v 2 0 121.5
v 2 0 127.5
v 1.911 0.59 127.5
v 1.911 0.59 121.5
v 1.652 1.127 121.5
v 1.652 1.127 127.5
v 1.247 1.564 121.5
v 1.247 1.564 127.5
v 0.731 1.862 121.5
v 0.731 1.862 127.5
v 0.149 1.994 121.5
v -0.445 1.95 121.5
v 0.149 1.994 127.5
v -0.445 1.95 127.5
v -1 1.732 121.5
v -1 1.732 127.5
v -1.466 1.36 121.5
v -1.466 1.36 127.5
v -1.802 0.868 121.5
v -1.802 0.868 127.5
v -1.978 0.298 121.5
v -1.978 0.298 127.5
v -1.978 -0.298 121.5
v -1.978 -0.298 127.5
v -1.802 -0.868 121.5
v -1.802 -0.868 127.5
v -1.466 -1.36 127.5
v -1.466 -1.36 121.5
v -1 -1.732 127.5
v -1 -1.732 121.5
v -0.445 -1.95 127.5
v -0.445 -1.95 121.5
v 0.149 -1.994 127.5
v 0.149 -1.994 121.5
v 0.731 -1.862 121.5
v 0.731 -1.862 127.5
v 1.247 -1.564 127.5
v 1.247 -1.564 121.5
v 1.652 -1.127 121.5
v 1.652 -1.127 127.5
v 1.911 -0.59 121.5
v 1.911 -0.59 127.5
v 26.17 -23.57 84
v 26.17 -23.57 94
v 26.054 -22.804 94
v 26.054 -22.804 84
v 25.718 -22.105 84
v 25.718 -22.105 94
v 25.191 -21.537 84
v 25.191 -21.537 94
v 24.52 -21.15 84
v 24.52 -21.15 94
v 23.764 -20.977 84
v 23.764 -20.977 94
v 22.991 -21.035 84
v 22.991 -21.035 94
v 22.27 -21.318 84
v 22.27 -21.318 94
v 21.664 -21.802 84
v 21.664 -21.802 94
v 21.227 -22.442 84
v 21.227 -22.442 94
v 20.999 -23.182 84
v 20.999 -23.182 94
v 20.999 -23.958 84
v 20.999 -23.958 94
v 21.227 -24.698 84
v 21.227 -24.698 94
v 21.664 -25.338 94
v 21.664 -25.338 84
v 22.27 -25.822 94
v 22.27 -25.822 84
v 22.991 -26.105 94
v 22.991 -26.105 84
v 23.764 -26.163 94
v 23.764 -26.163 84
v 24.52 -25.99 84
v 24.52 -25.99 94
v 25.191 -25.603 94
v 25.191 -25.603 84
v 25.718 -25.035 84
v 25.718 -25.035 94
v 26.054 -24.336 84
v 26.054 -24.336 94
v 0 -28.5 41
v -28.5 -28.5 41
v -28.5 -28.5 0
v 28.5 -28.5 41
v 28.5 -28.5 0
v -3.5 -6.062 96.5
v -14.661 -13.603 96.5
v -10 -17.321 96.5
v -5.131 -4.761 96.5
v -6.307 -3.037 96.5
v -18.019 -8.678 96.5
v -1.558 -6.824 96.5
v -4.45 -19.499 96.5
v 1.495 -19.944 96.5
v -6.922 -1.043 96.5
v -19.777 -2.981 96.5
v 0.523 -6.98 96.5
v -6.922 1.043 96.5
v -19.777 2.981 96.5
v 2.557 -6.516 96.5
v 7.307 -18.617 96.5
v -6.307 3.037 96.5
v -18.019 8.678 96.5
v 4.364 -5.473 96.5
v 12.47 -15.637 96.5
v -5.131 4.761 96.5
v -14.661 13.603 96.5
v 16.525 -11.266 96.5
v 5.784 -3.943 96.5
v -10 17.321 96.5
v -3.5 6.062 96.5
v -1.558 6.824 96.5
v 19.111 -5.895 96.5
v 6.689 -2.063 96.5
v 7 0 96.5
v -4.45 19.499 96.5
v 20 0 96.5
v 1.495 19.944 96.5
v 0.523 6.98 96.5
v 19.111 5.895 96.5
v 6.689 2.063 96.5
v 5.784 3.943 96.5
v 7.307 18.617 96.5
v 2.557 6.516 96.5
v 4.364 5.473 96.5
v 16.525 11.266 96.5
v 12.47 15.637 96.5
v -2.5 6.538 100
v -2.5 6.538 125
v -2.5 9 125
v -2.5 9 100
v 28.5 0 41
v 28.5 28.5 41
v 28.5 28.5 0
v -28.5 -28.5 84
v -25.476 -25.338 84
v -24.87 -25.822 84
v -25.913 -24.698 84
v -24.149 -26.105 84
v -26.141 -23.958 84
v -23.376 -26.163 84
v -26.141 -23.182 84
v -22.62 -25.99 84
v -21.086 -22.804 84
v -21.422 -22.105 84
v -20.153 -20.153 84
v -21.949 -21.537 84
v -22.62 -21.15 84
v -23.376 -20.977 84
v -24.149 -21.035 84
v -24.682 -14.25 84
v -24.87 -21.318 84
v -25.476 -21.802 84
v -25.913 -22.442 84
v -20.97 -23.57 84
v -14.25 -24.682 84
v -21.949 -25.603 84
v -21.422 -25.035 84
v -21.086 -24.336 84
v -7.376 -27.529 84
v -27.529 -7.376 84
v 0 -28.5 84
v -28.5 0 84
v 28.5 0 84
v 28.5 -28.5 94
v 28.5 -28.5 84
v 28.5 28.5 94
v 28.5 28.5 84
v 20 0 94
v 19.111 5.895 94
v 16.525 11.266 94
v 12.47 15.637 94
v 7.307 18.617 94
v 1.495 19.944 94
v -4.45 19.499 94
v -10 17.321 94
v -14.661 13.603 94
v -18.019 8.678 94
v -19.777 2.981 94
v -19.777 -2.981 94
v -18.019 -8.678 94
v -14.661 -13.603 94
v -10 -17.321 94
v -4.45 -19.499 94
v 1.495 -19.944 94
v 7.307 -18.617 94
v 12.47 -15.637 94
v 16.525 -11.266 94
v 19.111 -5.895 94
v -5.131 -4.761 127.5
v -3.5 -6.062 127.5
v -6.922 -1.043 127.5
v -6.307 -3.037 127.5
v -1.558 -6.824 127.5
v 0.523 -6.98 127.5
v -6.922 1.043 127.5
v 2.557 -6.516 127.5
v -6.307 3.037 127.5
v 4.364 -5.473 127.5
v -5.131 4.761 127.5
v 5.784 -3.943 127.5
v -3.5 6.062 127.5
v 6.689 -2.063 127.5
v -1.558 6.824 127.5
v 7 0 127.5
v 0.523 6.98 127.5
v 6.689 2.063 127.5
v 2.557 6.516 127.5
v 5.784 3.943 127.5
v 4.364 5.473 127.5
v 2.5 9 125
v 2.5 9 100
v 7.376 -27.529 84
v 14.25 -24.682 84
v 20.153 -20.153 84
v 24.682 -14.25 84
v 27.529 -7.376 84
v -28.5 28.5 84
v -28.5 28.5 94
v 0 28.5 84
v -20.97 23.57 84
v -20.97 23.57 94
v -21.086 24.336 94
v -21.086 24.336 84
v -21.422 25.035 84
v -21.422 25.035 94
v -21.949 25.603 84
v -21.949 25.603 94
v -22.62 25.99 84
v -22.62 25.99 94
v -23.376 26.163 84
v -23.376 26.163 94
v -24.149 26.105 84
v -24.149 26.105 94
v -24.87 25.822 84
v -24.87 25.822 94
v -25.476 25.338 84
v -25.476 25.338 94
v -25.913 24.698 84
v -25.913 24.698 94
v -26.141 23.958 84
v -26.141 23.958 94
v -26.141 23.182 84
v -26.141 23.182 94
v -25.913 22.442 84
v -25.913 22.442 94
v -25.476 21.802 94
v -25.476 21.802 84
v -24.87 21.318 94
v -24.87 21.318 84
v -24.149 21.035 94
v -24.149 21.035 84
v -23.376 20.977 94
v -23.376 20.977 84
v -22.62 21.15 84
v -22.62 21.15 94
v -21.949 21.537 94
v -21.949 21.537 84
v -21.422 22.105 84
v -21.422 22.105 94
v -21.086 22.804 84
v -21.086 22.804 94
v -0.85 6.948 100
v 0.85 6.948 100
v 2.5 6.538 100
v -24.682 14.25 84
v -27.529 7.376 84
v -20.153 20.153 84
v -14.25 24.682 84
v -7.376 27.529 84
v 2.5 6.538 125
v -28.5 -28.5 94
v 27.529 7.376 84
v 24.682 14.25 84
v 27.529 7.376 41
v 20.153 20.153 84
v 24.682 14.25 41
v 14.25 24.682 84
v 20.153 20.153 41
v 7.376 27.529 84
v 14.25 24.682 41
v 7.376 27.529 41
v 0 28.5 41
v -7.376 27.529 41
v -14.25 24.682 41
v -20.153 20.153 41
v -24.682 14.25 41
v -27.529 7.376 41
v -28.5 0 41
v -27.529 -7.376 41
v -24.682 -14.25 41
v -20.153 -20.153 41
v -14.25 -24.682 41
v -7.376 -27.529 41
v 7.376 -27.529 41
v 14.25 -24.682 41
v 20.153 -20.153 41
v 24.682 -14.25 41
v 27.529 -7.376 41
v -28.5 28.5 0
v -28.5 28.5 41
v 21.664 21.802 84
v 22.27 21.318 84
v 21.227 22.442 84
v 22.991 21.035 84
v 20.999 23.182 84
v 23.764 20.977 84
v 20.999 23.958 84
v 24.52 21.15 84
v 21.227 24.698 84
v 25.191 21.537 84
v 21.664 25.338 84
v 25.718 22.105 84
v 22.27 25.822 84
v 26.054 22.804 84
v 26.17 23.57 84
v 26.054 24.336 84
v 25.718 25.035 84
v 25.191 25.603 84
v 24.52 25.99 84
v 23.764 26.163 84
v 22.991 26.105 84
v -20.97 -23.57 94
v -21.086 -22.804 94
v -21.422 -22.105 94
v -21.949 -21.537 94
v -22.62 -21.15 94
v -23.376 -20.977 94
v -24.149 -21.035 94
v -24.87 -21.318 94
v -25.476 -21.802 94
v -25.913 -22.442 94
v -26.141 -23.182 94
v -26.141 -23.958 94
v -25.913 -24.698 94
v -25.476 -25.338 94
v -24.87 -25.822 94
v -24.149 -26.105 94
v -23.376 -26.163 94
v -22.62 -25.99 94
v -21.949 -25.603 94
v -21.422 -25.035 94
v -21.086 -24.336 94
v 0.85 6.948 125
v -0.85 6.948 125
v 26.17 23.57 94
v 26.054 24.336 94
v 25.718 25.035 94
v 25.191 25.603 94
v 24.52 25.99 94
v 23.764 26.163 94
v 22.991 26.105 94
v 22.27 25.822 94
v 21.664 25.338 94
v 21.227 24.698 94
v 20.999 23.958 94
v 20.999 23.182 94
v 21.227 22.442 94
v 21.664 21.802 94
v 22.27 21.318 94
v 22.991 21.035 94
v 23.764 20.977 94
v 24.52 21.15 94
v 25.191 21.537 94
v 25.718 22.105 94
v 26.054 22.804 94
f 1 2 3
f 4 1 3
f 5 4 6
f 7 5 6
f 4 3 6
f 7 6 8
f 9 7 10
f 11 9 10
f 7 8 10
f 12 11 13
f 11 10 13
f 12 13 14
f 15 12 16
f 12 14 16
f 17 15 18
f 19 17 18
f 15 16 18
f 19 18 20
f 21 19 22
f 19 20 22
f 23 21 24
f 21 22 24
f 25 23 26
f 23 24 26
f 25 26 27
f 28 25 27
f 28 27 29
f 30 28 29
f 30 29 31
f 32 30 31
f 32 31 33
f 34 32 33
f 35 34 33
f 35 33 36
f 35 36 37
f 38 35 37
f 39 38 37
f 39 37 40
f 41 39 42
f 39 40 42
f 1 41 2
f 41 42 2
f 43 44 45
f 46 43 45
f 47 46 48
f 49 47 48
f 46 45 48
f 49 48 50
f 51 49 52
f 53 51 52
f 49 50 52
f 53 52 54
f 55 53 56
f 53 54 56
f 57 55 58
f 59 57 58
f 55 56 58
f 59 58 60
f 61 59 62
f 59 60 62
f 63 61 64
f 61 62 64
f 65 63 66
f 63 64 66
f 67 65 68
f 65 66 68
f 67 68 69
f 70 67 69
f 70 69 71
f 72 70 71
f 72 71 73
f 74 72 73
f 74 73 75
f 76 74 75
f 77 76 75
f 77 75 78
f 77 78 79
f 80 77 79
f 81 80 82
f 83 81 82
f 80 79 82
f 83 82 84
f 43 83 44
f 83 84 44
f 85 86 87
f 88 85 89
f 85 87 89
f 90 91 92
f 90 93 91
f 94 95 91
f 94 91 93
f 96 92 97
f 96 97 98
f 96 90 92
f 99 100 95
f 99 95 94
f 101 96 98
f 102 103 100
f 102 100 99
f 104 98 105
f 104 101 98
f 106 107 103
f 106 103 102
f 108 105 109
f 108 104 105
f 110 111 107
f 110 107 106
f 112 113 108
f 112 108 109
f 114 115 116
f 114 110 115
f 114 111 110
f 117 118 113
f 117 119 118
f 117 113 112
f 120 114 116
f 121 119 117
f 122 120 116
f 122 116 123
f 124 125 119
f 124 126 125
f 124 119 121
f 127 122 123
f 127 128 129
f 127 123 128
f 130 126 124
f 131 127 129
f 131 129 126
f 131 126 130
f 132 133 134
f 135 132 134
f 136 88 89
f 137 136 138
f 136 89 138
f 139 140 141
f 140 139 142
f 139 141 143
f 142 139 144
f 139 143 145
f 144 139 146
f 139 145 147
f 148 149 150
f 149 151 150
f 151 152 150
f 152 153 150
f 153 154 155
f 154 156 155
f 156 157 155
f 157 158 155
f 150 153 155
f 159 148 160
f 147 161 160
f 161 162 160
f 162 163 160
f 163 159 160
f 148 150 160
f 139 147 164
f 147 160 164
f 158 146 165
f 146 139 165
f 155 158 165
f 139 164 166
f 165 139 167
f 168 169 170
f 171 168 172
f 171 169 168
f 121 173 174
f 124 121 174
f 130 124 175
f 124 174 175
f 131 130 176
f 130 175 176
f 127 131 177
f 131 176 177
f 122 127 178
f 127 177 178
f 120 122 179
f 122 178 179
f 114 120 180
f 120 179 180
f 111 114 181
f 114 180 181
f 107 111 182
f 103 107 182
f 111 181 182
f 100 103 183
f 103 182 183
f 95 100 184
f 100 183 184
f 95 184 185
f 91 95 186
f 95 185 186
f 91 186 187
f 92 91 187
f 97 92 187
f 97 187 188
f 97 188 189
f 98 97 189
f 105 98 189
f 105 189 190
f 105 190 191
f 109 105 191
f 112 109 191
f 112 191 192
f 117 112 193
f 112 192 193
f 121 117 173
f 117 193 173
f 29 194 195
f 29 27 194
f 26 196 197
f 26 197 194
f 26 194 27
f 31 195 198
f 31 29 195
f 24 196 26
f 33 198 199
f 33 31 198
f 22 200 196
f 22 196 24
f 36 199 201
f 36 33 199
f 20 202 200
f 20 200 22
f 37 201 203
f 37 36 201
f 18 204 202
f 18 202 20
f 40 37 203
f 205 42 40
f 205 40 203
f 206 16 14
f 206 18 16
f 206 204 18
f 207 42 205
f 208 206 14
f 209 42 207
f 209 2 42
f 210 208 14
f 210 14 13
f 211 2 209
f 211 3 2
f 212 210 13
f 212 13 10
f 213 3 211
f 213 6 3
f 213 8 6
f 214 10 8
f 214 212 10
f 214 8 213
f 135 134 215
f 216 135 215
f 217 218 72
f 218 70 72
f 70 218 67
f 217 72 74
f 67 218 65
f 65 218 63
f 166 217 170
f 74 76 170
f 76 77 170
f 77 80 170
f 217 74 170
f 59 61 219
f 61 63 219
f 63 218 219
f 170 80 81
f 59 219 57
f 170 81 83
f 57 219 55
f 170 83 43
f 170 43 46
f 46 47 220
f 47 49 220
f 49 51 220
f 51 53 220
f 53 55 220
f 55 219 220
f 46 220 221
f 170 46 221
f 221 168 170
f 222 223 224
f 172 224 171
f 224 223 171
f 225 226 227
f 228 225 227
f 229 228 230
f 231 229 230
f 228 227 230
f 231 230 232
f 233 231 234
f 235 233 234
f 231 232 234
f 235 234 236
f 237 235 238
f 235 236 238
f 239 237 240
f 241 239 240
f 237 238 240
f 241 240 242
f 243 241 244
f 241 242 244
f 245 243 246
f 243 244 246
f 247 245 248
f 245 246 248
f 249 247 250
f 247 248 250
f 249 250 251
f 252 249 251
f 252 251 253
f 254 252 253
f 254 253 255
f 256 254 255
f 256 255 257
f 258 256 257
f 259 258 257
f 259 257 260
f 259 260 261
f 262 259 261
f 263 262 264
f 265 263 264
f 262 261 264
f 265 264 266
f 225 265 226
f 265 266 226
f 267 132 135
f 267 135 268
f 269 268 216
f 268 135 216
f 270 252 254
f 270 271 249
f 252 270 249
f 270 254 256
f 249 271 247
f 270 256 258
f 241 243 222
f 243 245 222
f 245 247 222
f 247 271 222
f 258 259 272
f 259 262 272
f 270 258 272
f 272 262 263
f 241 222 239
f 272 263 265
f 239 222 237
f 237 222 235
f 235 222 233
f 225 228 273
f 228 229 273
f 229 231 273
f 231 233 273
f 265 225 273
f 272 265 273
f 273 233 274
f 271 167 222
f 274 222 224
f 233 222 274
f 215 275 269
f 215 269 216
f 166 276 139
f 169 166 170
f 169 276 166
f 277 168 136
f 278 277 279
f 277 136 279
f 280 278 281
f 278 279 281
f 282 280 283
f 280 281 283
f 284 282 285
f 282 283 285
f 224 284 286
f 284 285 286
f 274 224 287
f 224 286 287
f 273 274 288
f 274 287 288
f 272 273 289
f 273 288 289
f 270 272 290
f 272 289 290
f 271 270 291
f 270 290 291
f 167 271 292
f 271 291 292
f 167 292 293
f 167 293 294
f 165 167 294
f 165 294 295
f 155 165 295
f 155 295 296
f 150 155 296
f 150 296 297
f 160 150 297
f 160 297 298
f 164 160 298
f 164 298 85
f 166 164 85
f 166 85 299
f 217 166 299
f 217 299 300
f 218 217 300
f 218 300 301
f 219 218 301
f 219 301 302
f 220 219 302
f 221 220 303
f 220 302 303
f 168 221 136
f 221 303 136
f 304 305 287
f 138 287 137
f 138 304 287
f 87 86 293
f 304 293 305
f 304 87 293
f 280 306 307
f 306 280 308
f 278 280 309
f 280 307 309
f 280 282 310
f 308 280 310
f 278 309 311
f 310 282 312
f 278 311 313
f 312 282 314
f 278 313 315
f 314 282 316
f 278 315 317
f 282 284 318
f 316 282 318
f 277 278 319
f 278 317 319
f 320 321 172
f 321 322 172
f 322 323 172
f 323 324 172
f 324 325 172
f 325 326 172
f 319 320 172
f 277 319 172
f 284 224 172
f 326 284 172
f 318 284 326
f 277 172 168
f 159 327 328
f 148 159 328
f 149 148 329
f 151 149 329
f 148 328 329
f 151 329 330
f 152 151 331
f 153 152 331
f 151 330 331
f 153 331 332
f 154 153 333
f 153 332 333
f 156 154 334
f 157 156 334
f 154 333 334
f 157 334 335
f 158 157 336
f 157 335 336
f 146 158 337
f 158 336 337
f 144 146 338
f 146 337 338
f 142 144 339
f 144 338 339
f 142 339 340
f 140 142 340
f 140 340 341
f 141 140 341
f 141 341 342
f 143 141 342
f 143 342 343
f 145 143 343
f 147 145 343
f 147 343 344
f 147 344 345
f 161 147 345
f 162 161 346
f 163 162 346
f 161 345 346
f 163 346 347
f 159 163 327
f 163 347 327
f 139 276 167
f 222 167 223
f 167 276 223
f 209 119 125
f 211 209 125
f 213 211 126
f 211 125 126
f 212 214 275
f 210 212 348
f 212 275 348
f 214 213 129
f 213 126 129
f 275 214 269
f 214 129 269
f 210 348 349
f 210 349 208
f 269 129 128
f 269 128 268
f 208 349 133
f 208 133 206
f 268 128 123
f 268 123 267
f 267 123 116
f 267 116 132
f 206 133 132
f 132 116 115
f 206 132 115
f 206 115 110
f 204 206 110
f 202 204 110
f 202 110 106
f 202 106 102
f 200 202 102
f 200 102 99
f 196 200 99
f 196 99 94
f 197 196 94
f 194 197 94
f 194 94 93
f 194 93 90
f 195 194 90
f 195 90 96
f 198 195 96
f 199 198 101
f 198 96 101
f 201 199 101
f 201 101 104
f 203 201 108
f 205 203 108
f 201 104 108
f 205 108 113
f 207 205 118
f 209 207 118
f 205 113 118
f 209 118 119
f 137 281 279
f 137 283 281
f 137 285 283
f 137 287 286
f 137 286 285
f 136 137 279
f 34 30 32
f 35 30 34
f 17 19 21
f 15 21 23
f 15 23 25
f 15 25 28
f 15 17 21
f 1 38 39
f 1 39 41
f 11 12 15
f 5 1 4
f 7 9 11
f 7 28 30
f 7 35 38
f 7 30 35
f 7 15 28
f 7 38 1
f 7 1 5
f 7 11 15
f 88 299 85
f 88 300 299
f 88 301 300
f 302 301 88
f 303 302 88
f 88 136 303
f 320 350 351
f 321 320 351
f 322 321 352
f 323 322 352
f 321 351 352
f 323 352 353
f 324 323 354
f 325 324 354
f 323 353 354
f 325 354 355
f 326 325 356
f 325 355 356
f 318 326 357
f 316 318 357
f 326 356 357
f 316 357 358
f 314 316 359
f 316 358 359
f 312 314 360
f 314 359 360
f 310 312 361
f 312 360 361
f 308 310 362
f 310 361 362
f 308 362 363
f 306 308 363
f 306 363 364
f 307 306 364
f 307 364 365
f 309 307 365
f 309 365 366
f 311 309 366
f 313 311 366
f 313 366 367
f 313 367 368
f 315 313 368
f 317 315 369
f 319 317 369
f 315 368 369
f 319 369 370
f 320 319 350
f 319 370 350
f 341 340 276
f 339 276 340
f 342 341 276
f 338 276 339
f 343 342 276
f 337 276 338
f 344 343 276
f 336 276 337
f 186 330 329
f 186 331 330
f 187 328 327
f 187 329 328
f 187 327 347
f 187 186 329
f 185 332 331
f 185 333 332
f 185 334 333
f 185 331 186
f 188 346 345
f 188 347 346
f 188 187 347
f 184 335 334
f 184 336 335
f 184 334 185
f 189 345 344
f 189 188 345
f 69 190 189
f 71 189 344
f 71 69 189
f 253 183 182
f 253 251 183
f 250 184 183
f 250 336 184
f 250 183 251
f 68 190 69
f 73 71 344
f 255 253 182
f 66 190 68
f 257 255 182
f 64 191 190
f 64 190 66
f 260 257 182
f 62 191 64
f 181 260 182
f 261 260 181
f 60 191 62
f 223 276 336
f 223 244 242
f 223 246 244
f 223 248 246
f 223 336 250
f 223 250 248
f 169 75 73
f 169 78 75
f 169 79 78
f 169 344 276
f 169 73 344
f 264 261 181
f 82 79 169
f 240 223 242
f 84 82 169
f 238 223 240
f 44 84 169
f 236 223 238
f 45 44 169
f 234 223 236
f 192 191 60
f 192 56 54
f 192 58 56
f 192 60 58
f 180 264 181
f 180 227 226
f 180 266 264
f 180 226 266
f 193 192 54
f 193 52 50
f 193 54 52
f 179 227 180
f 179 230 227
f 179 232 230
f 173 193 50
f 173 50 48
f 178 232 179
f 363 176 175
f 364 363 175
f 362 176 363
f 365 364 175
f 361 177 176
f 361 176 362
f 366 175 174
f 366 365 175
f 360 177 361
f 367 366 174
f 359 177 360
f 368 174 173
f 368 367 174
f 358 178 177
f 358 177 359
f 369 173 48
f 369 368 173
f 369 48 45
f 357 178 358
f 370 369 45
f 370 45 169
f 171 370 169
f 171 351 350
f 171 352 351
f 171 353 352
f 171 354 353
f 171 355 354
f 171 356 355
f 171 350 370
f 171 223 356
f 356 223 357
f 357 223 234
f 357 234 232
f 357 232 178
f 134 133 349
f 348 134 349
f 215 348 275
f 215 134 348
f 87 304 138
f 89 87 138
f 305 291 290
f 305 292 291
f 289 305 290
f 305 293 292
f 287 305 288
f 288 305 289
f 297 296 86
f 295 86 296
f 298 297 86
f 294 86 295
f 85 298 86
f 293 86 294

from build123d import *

# Parameters (mm, degrees)
SKETCH_1_W          = 57
SKETCH_1_H          = 57
EXTRUDE_1_DEPTH     = 41
SKETCH_2_R          = 28.5
EXTRUDE_2_DEPTH     = 53
SKETCH_3_R          = 20
EXTRUDE_3_DEPTH     = 2.5
SKETCH_4_R          = 7
EXTRUDE_4_DEPTH     = 31
SKETCH_7_W          = 57
SKETCH_7_H          = 57
SKETCH_7_R          = 2.6
EXTRUDE_5_DEPTH     = 10
SKETCH_8_W          = 5
SKETCH_8_H          = 4
EXTRUDE_6_DEPTH     = 25
SKETCH_9_R          = 2
CUT_EXTRUDE_1_DEPTH = 6


with BuildPart() as part:
    # 草图1 → 凸台-拉伸1 (new body)
    with BuildSketch(Plane.XY):
        Rectangle(SKETCH_1_W, SKETCH_1_H)
    extrude(amount=EXTRUDE_1_DEPTH)

    # 草图2 → 凸台-拉伸2 (add)
    with BuildSketch(Plane.XY.offset(41)):
        Circle(SKETCH_2_R)
    extrude(amount=EXTRUDE_2_DEPTH)

    # 草图3 → 凸台-拉伸3 (add)
    with BuildSketch(Plane.XY.offset(94)):
        Circle(SKETCH_3_R)
    extrude(amount=EXTRUDE_3_DEPTH)

    # 草图4 → 凸台-拉伸4 (add)
    with BuildSketch(Plane.XY.offset(96.5)):
        Circle(SKETCH_4_R)
    extrude(amount=EXTRUDE_4_DEPTH)

    # 草图7 → 凸台-拉伸5 (add)
    with BuildSketch(Plane.XY.offset(94)):
        Rectangle(SKETCH_7_W, SKETCH_7_H)
        with Locations((-23.57, 23.57)):
            Circle(SKETCH_7_R, mode=Mode.SUBTRACT)
        with Locations((23.57, 23.57)):
            Circle(SKETCH_7_R, mode=Mode.SUBTRACT)
        with Locations((23.57, -23.57)):
            Circle(SKETCH_7_R, mode=Mode.SUBTRACT)
        with Locations((-23.57, -23.57)):
            Circle(SKETCH_7_R, mode=Mode.SUBTRACT)
    extrude(amount=-EXTRUDE_5_DEPTH)

    # 草图8 → 凸台-拉伸6 (add)
    with BuildSketch(Plane.XY.offset(125)):
        with Locations((0, 7)):
            Rectangle(SKETCH_8_W, SKETCH_8_H)
    extrude(amount=-EXTRUDE_6_DEPTH)

    # 草图9 → 切除-拉伸1 (cut)
    with BuildSketch(Plane.XY.offset(127.5)):
        Circle(SKETCH_9_R)
    extrude(amount=-CUT_EXTRUDE_1_DEPTH, mode=Mode.SUBTRACT)


solid = part.part
